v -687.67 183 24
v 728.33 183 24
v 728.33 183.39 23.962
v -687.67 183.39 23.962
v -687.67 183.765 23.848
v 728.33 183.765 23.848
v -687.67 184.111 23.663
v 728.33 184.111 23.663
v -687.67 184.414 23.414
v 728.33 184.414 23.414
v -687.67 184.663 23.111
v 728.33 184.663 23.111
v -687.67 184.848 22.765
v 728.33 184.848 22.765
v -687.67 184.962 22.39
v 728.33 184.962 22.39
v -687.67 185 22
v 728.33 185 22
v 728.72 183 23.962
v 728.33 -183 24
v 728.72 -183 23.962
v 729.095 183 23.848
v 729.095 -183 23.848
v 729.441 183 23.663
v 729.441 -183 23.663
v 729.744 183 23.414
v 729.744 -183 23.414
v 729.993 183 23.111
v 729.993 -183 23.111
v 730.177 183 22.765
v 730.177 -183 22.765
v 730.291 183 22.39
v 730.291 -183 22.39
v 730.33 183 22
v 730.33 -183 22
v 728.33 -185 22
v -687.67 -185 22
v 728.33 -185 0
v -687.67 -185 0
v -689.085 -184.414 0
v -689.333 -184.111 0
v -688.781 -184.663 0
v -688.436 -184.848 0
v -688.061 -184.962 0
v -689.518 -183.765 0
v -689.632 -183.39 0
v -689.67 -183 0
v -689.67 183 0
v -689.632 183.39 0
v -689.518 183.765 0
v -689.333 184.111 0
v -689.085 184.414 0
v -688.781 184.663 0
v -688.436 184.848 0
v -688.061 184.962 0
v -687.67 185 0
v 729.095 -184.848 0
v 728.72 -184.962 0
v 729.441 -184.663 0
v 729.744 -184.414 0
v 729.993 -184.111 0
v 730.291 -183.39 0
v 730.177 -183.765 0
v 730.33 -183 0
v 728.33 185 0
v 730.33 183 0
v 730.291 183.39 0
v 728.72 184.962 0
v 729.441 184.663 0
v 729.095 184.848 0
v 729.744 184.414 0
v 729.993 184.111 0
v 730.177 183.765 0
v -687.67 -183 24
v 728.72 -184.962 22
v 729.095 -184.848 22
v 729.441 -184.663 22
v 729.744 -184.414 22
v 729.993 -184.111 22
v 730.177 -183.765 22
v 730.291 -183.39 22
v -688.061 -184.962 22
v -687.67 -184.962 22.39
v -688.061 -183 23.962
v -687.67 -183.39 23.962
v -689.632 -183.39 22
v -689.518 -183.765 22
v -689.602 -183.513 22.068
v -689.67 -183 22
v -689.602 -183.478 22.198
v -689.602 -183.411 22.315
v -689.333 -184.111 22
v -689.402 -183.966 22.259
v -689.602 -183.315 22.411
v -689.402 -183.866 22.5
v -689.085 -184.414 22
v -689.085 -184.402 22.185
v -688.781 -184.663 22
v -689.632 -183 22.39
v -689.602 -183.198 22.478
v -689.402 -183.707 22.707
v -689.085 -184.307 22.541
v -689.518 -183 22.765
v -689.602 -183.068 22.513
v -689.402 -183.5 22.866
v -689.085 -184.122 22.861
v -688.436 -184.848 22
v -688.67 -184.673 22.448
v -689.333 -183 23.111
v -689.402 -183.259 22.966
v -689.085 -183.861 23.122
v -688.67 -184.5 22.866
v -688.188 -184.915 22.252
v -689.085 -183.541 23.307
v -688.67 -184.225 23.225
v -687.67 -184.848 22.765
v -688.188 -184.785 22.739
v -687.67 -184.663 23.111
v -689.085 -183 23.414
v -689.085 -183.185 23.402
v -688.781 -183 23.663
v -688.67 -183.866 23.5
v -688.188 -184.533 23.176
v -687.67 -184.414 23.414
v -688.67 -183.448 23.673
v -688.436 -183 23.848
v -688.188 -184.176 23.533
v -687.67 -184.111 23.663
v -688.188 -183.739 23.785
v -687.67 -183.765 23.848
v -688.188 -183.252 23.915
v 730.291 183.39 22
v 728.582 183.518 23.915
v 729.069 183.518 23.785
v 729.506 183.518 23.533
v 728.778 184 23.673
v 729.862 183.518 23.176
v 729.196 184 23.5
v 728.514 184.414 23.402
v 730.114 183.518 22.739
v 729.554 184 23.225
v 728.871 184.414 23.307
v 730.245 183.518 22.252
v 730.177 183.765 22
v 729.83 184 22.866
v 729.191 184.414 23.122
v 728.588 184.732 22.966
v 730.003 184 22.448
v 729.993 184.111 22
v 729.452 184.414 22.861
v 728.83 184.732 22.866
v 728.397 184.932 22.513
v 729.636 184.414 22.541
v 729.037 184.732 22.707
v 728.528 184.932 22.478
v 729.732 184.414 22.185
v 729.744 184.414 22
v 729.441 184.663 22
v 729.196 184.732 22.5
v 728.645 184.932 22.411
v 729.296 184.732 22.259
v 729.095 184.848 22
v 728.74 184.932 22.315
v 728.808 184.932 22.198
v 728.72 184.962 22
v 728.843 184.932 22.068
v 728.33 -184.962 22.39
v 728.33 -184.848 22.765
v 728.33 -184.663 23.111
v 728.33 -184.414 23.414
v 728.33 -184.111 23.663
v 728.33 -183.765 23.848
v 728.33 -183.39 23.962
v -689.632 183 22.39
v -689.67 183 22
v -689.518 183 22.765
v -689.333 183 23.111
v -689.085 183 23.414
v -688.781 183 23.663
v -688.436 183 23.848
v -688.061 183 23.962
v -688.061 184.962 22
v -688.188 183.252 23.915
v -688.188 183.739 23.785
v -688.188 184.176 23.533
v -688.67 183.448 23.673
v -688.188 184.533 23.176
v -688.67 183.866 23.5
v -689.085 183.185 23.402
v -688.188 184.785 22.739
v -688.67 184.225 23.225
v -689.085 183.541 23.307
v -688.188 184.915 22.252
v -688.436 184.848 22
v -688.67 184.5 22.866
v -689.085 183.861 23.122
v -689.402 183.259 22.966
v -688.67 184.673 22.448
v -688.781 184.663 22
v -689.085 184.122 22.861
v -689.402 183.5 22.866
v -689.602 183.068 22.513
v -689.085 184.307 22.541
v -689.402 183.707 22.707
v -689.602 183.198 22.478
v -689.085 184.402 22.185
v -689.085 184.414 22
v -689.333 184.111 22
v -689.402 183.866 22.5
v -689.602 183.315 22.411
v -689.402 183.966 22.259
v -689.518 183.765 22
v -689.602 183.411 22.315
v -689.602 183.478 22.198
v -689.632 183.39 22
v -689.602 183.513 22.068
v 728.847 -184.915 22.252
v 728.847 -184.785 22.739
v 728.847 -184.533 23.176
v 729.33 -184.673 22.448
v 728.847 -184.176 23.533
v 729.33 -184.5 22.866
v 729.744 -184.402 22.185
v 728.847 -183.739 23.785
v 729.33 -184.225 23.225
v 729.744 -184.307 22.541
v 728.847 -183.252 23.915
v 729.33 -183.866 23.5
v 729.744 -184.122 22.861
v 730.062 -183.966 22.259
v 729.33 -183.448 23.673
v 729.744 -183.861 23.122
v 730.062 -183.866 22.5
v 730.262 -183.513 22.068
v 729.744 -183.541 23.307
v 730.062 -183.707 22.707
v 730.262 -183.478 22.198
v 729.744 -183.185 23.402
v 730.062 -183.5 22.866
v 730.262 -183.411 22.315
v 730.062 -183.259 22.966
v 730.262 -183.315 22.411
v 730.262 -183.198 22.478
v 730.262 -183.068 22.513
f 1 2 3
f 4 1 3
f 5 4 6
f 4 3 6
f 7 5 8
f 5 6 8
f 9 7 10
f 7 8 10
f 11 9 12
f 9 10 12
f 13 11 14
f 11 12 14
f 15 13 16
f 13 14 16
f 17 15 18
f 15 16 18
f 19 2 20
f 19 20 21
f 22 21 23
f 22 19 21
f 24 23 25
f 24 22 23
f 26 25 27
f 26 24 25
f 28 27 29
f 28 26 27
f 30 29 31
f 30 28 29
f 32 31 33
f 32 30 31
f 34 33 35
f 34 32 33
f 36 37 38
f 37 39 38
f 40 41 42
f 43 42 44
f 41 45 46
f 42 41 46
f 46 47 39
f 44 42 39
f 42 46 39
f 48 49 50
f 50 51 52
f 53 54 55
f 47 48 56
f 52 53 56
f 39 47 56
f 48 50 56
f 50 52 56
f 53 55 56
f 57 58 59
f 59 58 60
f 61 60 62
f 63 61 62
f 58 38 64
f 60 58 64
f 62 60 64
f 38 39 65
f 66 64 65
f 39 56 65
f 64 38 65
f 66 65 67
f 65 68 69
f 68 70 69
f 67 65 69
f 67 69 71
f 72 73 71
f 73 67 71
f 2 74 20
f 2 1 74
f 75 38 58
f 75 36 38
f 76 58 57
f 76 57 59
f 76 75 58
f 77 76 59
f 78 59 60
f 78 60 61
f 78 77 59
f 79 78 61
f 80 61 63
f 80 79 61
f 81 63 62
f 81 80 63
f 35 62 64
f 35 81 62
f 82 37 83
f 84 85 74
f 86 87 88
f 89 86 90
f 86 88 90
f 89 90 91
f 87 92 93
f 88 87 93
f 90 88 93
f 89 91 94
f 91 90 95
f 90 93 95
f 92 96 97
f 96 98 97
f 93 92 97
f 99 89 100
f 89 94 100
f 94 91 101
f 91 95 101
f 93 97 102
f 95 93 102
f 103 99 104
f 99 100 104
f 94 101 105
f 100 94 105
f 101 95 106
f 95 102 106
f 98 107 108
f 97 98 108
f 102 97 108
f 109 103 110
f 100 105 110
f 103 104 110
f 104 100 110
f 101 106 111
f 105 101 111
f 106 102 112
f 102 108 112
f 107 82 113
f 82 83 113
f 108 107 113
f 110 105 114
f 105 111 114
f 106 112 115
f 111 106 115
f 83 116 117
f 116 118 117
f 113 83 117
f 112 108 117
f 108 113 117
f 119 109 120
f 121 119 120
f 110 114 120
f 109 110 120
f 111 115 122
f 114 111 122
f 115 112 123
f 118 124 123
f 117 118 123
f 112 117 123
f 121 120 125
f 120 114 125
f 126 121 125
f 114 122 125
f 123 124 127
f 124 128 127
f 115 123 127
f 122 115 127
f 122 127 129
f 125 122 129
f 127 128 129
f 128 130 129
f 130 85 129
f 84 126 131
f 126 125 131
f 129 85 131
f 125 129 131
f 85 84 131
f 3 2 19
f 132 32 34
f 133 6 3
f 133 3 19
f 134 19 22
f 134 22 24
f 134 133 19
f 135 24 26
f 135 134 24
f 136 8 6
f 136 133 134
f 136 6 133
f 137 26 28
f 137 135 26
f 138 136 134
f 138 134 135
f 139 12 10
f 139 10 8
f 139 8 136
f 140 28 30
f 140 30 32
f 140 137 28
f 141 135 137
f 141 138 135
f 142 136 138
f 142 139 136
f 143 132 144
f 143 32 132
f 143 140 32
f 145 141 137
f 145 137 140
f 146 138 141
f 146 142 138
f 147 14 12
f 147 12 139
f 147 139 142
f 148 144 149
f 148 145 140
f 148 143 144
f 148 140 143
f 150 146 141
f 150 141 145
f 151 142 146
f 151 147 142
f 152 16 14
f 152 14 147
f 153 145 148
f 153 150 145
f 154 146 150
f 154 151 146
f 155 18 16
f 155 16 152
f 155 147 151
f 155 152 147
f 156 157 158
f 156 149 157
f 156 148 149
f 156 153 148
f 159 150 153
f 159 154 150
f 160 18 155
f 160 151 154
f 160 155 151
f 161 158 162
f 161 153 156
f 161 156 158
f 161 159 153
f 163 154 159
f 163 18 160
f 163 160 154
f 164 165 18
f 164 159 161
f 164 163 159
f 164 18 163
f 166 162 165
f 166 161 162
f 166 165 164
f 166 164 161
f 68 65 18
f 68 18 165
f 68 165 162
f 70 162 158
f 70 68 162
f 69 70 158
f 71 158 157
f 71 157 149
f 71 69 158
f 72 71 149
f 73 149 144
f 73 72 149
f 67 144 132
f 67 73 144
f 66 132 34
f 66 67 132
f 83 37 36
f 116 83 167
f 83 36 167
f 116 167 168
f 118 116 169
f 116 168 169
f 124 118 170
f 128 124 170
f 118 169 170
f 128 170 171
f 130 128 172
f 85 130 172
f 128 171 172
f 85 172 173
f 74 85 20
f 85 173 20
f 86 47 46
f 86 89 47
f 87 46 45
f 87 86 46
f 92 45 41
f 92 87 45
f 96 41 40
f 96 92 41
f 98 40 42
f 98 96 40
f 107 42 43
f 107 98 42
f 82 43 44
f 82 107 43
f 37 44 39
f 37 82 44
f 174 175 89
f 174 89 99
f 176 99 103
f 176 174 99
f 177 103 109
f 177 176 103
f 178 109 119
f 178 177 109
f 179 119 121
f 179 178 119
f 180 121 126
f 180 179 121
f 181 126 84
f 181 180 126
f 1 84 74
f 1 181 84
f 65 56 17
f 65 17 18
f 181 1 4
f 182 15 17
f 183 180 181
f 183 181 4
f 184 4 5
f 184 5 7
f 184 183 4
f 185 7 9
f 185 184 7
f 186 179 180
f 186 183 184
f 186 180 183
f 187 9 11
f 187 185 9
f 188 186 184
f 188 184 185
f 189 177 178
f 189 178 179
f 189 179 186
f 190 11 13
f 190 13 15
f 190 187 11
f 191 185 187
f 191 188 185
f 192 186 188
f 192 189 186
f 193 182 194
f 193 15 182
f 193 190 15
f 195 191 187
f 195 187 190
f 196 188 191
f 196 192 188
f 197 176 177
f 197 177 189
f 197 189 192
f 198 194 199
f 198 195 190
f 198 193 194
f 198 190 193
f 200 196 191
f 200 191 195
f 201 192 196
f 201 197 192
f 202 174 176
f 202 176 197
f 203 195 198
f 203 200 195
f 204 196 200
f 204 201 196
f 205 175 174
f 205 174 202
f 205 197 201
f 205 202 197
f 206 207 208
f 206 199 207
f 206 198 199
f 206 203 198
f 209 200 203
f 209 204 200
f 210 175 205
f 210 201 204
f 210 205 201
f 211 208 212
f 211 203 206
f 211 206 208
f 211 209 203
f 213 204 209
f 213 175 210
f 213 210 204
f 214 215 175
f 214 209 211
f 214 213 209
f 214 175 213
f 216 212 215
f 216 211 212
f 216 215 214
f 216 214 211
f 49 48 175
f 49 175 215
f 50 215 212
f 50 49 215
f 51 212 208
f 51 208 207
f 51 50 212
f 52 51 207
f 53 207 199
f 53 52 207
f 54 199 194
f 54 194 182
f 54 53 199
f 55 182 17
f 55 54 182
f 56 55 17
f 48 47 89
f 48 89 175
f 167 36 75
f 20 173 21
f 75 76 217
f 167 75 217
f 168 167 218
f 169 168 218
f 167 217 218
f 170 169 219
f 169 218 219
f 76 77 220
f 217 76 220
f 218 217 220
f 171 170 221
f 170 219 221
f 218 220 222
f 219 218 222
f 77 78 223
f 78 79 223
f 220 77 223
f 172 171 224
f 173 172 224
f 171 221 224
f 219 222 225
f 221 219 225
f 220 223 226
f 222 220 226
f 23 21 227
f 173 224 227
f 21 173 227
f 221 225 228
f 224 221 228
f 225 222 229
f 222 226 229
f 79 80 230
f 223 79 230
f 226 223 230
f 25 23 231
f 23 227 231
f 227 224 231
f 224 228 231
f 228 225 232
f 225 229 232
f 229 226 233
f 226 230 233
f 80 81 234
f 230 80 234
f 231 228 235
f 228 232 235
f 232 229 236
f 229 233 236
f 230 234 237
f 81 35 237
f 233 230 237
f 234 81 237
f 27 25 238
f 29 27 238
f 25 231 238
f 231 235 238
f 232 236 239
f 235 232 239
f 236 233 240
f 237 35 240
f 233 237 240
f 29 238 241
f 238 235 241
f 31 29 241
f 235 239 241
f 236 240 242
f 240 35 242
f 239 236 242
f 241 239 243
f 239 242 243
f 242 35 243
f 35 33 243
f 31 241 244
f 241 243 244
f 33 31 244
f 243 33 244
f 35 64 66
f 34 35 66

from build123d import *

# Parameters (mm, degrees)
F0_W        = 1420
F0_H        = 370
F1_DEPTH    = 24
F2_R        = 2
F3_R        = 2
F4_T1_DEPTH = 27
F4_S5_W     = 2
F4_S5_H     = 2
F4_T6_DEPTH = 2
F5_T1_DEPTH = 27
F5_S5_W     = 2
F5_S5_H     = 2
F5_T6_DEPTH = 2


# Not quite as in the source:
# - a fillet or chamfer that OpenCascade refuses, or shapes differently, is made with other operations: its cross-section is extruded or revolved along the edge and cut away or added


with BuildPart() as f1:
    # F0 (on Top) → F1 (new body)
    with BuildSketch(Plane.XY):
        with Locations((20.329669588, 0)):
            Rectangle(F0_W, F0_H)
    extrude(amount=F1_DEPTH)

    # F2
    f2_edges = [f1.edges().sort_by_distance(p)[0] for p in [
        (20.32967, -185, 24),
    ]]
    fillet(f2_edges, radius=F2_R)

    # F3
    f3_edges = [f1.edges().sort_by_distance(p)[0] for p in [
        (-689.67033, 1, 24),
        (730.32967, 1, 24),
        (20.32967, 185, 24),
    ]]
    fillet(f3_edges, radius=F3_R)

    # F4: fillet of radius 2 on 1 edges, made by hand

    # F4_s2 → F4_t1 (cut)
    with BuildSketch(Plane.XY.offset(-5)):
        with BuildLine():
            ThreePointArc((728.329669588, 185), (729.7438831503, 184.4142135624), (730.329669588, 183))
            Line((730.329669588, 183), (730.329669588, 185))
            Line((730.329669588, 185), (728.329669588, 185))
        make_face()
    extrude(amount=F4_T1_DEPTH, mode=Mode.SUBTRACT)


with BuildPart() as f4_tool4:
    # F4_s5 → F4_t6 (new body)
    with BuildSketch(Plane.XZ.offset(-183)):
        with Locations((729.329669588, 23)):
            Rectangle(F4_S5_W, F4_S5_H)
    extrude(amount=-F4_T6_DEPTH)

    # F4_s7 → F4_t8 (revolve, cut)
    with BuildSketch(Plane(origin=(728.329669588, 183, 22), x_dir=(-0.7071067812, 0, -0.7071067812), z_dir=(0.7071067812, 0, -0.7071067812))):
        with BuildLine():
            ThreePointArc((0, -2), (2, 0), (0, 2))
            Line((0, 2), (0, -2))
        make_face()
    revolve(axis=Axis((728.329669588, 183, 22), (0, 1, 0)), mode=Mode.SUBTRACT)


with BuildPart() as f1_1:
    add(f1.part)

    # F4_t3: cut F4_tool4
    add(f4_tool4.part, mode=Mode.SUBTRACT)

    # F5: fillet of radius 2 on 1 edges, made by hand

    # F5_s2 → F5_t1 (cut)
    with BuildSketch(Plane.XY.offset(-5)):
        with BuildLine():
            ThreePointArc((-689.670330412, 183), (-689.0845439744, 184.4142135624), (-687.670330412, 185))
            Line((-687.670330412, 185), (-689.670330412, 185))
            Line((-689.670330412, 185), (-689.670330412, 183))
        make_face()
    extrude(amount=F5_T1_DEPTH, mode=Mode.SUBTRACT)


with BuildPart() as f5_tool4:
    # F5_s5 → F5_t6 (new body)
    with BuildSketch(Plane.YZ.offset(-687.670330412)):
        with Locations((184, 23)):
            Rectangle(F5_S5_W, F5_S5_H)
    extrude(amount=-F5_T6_DEPTH)

    # F5_s7 → F5_t8 (revolve, cut)
    with BuildSketch(Plane(origin=(-687.670330412, 183, 22), x_dir=(0, -0.7071067812, -0.7071067812), z_dir=(0, 0.7071067812, -0.7071067812))):
        with BuildLine():
            ThreePointArc((0, -2), (2, 0), (0, 2))
            Line((0, 2), (0, -2))
        make_face()
    revolve(axis=Axis((-687.670330412, 183, 22), (-1, 0, 0)), mode=Mode.SUBTRACT)


with BuildPart() as f1_2:
    add(f1_1.part)

    # F5_t3: cut F5_tool4
    add(f5_tool4.part, mode=Mode.SUBTRACT)


solid = f1_2.part
